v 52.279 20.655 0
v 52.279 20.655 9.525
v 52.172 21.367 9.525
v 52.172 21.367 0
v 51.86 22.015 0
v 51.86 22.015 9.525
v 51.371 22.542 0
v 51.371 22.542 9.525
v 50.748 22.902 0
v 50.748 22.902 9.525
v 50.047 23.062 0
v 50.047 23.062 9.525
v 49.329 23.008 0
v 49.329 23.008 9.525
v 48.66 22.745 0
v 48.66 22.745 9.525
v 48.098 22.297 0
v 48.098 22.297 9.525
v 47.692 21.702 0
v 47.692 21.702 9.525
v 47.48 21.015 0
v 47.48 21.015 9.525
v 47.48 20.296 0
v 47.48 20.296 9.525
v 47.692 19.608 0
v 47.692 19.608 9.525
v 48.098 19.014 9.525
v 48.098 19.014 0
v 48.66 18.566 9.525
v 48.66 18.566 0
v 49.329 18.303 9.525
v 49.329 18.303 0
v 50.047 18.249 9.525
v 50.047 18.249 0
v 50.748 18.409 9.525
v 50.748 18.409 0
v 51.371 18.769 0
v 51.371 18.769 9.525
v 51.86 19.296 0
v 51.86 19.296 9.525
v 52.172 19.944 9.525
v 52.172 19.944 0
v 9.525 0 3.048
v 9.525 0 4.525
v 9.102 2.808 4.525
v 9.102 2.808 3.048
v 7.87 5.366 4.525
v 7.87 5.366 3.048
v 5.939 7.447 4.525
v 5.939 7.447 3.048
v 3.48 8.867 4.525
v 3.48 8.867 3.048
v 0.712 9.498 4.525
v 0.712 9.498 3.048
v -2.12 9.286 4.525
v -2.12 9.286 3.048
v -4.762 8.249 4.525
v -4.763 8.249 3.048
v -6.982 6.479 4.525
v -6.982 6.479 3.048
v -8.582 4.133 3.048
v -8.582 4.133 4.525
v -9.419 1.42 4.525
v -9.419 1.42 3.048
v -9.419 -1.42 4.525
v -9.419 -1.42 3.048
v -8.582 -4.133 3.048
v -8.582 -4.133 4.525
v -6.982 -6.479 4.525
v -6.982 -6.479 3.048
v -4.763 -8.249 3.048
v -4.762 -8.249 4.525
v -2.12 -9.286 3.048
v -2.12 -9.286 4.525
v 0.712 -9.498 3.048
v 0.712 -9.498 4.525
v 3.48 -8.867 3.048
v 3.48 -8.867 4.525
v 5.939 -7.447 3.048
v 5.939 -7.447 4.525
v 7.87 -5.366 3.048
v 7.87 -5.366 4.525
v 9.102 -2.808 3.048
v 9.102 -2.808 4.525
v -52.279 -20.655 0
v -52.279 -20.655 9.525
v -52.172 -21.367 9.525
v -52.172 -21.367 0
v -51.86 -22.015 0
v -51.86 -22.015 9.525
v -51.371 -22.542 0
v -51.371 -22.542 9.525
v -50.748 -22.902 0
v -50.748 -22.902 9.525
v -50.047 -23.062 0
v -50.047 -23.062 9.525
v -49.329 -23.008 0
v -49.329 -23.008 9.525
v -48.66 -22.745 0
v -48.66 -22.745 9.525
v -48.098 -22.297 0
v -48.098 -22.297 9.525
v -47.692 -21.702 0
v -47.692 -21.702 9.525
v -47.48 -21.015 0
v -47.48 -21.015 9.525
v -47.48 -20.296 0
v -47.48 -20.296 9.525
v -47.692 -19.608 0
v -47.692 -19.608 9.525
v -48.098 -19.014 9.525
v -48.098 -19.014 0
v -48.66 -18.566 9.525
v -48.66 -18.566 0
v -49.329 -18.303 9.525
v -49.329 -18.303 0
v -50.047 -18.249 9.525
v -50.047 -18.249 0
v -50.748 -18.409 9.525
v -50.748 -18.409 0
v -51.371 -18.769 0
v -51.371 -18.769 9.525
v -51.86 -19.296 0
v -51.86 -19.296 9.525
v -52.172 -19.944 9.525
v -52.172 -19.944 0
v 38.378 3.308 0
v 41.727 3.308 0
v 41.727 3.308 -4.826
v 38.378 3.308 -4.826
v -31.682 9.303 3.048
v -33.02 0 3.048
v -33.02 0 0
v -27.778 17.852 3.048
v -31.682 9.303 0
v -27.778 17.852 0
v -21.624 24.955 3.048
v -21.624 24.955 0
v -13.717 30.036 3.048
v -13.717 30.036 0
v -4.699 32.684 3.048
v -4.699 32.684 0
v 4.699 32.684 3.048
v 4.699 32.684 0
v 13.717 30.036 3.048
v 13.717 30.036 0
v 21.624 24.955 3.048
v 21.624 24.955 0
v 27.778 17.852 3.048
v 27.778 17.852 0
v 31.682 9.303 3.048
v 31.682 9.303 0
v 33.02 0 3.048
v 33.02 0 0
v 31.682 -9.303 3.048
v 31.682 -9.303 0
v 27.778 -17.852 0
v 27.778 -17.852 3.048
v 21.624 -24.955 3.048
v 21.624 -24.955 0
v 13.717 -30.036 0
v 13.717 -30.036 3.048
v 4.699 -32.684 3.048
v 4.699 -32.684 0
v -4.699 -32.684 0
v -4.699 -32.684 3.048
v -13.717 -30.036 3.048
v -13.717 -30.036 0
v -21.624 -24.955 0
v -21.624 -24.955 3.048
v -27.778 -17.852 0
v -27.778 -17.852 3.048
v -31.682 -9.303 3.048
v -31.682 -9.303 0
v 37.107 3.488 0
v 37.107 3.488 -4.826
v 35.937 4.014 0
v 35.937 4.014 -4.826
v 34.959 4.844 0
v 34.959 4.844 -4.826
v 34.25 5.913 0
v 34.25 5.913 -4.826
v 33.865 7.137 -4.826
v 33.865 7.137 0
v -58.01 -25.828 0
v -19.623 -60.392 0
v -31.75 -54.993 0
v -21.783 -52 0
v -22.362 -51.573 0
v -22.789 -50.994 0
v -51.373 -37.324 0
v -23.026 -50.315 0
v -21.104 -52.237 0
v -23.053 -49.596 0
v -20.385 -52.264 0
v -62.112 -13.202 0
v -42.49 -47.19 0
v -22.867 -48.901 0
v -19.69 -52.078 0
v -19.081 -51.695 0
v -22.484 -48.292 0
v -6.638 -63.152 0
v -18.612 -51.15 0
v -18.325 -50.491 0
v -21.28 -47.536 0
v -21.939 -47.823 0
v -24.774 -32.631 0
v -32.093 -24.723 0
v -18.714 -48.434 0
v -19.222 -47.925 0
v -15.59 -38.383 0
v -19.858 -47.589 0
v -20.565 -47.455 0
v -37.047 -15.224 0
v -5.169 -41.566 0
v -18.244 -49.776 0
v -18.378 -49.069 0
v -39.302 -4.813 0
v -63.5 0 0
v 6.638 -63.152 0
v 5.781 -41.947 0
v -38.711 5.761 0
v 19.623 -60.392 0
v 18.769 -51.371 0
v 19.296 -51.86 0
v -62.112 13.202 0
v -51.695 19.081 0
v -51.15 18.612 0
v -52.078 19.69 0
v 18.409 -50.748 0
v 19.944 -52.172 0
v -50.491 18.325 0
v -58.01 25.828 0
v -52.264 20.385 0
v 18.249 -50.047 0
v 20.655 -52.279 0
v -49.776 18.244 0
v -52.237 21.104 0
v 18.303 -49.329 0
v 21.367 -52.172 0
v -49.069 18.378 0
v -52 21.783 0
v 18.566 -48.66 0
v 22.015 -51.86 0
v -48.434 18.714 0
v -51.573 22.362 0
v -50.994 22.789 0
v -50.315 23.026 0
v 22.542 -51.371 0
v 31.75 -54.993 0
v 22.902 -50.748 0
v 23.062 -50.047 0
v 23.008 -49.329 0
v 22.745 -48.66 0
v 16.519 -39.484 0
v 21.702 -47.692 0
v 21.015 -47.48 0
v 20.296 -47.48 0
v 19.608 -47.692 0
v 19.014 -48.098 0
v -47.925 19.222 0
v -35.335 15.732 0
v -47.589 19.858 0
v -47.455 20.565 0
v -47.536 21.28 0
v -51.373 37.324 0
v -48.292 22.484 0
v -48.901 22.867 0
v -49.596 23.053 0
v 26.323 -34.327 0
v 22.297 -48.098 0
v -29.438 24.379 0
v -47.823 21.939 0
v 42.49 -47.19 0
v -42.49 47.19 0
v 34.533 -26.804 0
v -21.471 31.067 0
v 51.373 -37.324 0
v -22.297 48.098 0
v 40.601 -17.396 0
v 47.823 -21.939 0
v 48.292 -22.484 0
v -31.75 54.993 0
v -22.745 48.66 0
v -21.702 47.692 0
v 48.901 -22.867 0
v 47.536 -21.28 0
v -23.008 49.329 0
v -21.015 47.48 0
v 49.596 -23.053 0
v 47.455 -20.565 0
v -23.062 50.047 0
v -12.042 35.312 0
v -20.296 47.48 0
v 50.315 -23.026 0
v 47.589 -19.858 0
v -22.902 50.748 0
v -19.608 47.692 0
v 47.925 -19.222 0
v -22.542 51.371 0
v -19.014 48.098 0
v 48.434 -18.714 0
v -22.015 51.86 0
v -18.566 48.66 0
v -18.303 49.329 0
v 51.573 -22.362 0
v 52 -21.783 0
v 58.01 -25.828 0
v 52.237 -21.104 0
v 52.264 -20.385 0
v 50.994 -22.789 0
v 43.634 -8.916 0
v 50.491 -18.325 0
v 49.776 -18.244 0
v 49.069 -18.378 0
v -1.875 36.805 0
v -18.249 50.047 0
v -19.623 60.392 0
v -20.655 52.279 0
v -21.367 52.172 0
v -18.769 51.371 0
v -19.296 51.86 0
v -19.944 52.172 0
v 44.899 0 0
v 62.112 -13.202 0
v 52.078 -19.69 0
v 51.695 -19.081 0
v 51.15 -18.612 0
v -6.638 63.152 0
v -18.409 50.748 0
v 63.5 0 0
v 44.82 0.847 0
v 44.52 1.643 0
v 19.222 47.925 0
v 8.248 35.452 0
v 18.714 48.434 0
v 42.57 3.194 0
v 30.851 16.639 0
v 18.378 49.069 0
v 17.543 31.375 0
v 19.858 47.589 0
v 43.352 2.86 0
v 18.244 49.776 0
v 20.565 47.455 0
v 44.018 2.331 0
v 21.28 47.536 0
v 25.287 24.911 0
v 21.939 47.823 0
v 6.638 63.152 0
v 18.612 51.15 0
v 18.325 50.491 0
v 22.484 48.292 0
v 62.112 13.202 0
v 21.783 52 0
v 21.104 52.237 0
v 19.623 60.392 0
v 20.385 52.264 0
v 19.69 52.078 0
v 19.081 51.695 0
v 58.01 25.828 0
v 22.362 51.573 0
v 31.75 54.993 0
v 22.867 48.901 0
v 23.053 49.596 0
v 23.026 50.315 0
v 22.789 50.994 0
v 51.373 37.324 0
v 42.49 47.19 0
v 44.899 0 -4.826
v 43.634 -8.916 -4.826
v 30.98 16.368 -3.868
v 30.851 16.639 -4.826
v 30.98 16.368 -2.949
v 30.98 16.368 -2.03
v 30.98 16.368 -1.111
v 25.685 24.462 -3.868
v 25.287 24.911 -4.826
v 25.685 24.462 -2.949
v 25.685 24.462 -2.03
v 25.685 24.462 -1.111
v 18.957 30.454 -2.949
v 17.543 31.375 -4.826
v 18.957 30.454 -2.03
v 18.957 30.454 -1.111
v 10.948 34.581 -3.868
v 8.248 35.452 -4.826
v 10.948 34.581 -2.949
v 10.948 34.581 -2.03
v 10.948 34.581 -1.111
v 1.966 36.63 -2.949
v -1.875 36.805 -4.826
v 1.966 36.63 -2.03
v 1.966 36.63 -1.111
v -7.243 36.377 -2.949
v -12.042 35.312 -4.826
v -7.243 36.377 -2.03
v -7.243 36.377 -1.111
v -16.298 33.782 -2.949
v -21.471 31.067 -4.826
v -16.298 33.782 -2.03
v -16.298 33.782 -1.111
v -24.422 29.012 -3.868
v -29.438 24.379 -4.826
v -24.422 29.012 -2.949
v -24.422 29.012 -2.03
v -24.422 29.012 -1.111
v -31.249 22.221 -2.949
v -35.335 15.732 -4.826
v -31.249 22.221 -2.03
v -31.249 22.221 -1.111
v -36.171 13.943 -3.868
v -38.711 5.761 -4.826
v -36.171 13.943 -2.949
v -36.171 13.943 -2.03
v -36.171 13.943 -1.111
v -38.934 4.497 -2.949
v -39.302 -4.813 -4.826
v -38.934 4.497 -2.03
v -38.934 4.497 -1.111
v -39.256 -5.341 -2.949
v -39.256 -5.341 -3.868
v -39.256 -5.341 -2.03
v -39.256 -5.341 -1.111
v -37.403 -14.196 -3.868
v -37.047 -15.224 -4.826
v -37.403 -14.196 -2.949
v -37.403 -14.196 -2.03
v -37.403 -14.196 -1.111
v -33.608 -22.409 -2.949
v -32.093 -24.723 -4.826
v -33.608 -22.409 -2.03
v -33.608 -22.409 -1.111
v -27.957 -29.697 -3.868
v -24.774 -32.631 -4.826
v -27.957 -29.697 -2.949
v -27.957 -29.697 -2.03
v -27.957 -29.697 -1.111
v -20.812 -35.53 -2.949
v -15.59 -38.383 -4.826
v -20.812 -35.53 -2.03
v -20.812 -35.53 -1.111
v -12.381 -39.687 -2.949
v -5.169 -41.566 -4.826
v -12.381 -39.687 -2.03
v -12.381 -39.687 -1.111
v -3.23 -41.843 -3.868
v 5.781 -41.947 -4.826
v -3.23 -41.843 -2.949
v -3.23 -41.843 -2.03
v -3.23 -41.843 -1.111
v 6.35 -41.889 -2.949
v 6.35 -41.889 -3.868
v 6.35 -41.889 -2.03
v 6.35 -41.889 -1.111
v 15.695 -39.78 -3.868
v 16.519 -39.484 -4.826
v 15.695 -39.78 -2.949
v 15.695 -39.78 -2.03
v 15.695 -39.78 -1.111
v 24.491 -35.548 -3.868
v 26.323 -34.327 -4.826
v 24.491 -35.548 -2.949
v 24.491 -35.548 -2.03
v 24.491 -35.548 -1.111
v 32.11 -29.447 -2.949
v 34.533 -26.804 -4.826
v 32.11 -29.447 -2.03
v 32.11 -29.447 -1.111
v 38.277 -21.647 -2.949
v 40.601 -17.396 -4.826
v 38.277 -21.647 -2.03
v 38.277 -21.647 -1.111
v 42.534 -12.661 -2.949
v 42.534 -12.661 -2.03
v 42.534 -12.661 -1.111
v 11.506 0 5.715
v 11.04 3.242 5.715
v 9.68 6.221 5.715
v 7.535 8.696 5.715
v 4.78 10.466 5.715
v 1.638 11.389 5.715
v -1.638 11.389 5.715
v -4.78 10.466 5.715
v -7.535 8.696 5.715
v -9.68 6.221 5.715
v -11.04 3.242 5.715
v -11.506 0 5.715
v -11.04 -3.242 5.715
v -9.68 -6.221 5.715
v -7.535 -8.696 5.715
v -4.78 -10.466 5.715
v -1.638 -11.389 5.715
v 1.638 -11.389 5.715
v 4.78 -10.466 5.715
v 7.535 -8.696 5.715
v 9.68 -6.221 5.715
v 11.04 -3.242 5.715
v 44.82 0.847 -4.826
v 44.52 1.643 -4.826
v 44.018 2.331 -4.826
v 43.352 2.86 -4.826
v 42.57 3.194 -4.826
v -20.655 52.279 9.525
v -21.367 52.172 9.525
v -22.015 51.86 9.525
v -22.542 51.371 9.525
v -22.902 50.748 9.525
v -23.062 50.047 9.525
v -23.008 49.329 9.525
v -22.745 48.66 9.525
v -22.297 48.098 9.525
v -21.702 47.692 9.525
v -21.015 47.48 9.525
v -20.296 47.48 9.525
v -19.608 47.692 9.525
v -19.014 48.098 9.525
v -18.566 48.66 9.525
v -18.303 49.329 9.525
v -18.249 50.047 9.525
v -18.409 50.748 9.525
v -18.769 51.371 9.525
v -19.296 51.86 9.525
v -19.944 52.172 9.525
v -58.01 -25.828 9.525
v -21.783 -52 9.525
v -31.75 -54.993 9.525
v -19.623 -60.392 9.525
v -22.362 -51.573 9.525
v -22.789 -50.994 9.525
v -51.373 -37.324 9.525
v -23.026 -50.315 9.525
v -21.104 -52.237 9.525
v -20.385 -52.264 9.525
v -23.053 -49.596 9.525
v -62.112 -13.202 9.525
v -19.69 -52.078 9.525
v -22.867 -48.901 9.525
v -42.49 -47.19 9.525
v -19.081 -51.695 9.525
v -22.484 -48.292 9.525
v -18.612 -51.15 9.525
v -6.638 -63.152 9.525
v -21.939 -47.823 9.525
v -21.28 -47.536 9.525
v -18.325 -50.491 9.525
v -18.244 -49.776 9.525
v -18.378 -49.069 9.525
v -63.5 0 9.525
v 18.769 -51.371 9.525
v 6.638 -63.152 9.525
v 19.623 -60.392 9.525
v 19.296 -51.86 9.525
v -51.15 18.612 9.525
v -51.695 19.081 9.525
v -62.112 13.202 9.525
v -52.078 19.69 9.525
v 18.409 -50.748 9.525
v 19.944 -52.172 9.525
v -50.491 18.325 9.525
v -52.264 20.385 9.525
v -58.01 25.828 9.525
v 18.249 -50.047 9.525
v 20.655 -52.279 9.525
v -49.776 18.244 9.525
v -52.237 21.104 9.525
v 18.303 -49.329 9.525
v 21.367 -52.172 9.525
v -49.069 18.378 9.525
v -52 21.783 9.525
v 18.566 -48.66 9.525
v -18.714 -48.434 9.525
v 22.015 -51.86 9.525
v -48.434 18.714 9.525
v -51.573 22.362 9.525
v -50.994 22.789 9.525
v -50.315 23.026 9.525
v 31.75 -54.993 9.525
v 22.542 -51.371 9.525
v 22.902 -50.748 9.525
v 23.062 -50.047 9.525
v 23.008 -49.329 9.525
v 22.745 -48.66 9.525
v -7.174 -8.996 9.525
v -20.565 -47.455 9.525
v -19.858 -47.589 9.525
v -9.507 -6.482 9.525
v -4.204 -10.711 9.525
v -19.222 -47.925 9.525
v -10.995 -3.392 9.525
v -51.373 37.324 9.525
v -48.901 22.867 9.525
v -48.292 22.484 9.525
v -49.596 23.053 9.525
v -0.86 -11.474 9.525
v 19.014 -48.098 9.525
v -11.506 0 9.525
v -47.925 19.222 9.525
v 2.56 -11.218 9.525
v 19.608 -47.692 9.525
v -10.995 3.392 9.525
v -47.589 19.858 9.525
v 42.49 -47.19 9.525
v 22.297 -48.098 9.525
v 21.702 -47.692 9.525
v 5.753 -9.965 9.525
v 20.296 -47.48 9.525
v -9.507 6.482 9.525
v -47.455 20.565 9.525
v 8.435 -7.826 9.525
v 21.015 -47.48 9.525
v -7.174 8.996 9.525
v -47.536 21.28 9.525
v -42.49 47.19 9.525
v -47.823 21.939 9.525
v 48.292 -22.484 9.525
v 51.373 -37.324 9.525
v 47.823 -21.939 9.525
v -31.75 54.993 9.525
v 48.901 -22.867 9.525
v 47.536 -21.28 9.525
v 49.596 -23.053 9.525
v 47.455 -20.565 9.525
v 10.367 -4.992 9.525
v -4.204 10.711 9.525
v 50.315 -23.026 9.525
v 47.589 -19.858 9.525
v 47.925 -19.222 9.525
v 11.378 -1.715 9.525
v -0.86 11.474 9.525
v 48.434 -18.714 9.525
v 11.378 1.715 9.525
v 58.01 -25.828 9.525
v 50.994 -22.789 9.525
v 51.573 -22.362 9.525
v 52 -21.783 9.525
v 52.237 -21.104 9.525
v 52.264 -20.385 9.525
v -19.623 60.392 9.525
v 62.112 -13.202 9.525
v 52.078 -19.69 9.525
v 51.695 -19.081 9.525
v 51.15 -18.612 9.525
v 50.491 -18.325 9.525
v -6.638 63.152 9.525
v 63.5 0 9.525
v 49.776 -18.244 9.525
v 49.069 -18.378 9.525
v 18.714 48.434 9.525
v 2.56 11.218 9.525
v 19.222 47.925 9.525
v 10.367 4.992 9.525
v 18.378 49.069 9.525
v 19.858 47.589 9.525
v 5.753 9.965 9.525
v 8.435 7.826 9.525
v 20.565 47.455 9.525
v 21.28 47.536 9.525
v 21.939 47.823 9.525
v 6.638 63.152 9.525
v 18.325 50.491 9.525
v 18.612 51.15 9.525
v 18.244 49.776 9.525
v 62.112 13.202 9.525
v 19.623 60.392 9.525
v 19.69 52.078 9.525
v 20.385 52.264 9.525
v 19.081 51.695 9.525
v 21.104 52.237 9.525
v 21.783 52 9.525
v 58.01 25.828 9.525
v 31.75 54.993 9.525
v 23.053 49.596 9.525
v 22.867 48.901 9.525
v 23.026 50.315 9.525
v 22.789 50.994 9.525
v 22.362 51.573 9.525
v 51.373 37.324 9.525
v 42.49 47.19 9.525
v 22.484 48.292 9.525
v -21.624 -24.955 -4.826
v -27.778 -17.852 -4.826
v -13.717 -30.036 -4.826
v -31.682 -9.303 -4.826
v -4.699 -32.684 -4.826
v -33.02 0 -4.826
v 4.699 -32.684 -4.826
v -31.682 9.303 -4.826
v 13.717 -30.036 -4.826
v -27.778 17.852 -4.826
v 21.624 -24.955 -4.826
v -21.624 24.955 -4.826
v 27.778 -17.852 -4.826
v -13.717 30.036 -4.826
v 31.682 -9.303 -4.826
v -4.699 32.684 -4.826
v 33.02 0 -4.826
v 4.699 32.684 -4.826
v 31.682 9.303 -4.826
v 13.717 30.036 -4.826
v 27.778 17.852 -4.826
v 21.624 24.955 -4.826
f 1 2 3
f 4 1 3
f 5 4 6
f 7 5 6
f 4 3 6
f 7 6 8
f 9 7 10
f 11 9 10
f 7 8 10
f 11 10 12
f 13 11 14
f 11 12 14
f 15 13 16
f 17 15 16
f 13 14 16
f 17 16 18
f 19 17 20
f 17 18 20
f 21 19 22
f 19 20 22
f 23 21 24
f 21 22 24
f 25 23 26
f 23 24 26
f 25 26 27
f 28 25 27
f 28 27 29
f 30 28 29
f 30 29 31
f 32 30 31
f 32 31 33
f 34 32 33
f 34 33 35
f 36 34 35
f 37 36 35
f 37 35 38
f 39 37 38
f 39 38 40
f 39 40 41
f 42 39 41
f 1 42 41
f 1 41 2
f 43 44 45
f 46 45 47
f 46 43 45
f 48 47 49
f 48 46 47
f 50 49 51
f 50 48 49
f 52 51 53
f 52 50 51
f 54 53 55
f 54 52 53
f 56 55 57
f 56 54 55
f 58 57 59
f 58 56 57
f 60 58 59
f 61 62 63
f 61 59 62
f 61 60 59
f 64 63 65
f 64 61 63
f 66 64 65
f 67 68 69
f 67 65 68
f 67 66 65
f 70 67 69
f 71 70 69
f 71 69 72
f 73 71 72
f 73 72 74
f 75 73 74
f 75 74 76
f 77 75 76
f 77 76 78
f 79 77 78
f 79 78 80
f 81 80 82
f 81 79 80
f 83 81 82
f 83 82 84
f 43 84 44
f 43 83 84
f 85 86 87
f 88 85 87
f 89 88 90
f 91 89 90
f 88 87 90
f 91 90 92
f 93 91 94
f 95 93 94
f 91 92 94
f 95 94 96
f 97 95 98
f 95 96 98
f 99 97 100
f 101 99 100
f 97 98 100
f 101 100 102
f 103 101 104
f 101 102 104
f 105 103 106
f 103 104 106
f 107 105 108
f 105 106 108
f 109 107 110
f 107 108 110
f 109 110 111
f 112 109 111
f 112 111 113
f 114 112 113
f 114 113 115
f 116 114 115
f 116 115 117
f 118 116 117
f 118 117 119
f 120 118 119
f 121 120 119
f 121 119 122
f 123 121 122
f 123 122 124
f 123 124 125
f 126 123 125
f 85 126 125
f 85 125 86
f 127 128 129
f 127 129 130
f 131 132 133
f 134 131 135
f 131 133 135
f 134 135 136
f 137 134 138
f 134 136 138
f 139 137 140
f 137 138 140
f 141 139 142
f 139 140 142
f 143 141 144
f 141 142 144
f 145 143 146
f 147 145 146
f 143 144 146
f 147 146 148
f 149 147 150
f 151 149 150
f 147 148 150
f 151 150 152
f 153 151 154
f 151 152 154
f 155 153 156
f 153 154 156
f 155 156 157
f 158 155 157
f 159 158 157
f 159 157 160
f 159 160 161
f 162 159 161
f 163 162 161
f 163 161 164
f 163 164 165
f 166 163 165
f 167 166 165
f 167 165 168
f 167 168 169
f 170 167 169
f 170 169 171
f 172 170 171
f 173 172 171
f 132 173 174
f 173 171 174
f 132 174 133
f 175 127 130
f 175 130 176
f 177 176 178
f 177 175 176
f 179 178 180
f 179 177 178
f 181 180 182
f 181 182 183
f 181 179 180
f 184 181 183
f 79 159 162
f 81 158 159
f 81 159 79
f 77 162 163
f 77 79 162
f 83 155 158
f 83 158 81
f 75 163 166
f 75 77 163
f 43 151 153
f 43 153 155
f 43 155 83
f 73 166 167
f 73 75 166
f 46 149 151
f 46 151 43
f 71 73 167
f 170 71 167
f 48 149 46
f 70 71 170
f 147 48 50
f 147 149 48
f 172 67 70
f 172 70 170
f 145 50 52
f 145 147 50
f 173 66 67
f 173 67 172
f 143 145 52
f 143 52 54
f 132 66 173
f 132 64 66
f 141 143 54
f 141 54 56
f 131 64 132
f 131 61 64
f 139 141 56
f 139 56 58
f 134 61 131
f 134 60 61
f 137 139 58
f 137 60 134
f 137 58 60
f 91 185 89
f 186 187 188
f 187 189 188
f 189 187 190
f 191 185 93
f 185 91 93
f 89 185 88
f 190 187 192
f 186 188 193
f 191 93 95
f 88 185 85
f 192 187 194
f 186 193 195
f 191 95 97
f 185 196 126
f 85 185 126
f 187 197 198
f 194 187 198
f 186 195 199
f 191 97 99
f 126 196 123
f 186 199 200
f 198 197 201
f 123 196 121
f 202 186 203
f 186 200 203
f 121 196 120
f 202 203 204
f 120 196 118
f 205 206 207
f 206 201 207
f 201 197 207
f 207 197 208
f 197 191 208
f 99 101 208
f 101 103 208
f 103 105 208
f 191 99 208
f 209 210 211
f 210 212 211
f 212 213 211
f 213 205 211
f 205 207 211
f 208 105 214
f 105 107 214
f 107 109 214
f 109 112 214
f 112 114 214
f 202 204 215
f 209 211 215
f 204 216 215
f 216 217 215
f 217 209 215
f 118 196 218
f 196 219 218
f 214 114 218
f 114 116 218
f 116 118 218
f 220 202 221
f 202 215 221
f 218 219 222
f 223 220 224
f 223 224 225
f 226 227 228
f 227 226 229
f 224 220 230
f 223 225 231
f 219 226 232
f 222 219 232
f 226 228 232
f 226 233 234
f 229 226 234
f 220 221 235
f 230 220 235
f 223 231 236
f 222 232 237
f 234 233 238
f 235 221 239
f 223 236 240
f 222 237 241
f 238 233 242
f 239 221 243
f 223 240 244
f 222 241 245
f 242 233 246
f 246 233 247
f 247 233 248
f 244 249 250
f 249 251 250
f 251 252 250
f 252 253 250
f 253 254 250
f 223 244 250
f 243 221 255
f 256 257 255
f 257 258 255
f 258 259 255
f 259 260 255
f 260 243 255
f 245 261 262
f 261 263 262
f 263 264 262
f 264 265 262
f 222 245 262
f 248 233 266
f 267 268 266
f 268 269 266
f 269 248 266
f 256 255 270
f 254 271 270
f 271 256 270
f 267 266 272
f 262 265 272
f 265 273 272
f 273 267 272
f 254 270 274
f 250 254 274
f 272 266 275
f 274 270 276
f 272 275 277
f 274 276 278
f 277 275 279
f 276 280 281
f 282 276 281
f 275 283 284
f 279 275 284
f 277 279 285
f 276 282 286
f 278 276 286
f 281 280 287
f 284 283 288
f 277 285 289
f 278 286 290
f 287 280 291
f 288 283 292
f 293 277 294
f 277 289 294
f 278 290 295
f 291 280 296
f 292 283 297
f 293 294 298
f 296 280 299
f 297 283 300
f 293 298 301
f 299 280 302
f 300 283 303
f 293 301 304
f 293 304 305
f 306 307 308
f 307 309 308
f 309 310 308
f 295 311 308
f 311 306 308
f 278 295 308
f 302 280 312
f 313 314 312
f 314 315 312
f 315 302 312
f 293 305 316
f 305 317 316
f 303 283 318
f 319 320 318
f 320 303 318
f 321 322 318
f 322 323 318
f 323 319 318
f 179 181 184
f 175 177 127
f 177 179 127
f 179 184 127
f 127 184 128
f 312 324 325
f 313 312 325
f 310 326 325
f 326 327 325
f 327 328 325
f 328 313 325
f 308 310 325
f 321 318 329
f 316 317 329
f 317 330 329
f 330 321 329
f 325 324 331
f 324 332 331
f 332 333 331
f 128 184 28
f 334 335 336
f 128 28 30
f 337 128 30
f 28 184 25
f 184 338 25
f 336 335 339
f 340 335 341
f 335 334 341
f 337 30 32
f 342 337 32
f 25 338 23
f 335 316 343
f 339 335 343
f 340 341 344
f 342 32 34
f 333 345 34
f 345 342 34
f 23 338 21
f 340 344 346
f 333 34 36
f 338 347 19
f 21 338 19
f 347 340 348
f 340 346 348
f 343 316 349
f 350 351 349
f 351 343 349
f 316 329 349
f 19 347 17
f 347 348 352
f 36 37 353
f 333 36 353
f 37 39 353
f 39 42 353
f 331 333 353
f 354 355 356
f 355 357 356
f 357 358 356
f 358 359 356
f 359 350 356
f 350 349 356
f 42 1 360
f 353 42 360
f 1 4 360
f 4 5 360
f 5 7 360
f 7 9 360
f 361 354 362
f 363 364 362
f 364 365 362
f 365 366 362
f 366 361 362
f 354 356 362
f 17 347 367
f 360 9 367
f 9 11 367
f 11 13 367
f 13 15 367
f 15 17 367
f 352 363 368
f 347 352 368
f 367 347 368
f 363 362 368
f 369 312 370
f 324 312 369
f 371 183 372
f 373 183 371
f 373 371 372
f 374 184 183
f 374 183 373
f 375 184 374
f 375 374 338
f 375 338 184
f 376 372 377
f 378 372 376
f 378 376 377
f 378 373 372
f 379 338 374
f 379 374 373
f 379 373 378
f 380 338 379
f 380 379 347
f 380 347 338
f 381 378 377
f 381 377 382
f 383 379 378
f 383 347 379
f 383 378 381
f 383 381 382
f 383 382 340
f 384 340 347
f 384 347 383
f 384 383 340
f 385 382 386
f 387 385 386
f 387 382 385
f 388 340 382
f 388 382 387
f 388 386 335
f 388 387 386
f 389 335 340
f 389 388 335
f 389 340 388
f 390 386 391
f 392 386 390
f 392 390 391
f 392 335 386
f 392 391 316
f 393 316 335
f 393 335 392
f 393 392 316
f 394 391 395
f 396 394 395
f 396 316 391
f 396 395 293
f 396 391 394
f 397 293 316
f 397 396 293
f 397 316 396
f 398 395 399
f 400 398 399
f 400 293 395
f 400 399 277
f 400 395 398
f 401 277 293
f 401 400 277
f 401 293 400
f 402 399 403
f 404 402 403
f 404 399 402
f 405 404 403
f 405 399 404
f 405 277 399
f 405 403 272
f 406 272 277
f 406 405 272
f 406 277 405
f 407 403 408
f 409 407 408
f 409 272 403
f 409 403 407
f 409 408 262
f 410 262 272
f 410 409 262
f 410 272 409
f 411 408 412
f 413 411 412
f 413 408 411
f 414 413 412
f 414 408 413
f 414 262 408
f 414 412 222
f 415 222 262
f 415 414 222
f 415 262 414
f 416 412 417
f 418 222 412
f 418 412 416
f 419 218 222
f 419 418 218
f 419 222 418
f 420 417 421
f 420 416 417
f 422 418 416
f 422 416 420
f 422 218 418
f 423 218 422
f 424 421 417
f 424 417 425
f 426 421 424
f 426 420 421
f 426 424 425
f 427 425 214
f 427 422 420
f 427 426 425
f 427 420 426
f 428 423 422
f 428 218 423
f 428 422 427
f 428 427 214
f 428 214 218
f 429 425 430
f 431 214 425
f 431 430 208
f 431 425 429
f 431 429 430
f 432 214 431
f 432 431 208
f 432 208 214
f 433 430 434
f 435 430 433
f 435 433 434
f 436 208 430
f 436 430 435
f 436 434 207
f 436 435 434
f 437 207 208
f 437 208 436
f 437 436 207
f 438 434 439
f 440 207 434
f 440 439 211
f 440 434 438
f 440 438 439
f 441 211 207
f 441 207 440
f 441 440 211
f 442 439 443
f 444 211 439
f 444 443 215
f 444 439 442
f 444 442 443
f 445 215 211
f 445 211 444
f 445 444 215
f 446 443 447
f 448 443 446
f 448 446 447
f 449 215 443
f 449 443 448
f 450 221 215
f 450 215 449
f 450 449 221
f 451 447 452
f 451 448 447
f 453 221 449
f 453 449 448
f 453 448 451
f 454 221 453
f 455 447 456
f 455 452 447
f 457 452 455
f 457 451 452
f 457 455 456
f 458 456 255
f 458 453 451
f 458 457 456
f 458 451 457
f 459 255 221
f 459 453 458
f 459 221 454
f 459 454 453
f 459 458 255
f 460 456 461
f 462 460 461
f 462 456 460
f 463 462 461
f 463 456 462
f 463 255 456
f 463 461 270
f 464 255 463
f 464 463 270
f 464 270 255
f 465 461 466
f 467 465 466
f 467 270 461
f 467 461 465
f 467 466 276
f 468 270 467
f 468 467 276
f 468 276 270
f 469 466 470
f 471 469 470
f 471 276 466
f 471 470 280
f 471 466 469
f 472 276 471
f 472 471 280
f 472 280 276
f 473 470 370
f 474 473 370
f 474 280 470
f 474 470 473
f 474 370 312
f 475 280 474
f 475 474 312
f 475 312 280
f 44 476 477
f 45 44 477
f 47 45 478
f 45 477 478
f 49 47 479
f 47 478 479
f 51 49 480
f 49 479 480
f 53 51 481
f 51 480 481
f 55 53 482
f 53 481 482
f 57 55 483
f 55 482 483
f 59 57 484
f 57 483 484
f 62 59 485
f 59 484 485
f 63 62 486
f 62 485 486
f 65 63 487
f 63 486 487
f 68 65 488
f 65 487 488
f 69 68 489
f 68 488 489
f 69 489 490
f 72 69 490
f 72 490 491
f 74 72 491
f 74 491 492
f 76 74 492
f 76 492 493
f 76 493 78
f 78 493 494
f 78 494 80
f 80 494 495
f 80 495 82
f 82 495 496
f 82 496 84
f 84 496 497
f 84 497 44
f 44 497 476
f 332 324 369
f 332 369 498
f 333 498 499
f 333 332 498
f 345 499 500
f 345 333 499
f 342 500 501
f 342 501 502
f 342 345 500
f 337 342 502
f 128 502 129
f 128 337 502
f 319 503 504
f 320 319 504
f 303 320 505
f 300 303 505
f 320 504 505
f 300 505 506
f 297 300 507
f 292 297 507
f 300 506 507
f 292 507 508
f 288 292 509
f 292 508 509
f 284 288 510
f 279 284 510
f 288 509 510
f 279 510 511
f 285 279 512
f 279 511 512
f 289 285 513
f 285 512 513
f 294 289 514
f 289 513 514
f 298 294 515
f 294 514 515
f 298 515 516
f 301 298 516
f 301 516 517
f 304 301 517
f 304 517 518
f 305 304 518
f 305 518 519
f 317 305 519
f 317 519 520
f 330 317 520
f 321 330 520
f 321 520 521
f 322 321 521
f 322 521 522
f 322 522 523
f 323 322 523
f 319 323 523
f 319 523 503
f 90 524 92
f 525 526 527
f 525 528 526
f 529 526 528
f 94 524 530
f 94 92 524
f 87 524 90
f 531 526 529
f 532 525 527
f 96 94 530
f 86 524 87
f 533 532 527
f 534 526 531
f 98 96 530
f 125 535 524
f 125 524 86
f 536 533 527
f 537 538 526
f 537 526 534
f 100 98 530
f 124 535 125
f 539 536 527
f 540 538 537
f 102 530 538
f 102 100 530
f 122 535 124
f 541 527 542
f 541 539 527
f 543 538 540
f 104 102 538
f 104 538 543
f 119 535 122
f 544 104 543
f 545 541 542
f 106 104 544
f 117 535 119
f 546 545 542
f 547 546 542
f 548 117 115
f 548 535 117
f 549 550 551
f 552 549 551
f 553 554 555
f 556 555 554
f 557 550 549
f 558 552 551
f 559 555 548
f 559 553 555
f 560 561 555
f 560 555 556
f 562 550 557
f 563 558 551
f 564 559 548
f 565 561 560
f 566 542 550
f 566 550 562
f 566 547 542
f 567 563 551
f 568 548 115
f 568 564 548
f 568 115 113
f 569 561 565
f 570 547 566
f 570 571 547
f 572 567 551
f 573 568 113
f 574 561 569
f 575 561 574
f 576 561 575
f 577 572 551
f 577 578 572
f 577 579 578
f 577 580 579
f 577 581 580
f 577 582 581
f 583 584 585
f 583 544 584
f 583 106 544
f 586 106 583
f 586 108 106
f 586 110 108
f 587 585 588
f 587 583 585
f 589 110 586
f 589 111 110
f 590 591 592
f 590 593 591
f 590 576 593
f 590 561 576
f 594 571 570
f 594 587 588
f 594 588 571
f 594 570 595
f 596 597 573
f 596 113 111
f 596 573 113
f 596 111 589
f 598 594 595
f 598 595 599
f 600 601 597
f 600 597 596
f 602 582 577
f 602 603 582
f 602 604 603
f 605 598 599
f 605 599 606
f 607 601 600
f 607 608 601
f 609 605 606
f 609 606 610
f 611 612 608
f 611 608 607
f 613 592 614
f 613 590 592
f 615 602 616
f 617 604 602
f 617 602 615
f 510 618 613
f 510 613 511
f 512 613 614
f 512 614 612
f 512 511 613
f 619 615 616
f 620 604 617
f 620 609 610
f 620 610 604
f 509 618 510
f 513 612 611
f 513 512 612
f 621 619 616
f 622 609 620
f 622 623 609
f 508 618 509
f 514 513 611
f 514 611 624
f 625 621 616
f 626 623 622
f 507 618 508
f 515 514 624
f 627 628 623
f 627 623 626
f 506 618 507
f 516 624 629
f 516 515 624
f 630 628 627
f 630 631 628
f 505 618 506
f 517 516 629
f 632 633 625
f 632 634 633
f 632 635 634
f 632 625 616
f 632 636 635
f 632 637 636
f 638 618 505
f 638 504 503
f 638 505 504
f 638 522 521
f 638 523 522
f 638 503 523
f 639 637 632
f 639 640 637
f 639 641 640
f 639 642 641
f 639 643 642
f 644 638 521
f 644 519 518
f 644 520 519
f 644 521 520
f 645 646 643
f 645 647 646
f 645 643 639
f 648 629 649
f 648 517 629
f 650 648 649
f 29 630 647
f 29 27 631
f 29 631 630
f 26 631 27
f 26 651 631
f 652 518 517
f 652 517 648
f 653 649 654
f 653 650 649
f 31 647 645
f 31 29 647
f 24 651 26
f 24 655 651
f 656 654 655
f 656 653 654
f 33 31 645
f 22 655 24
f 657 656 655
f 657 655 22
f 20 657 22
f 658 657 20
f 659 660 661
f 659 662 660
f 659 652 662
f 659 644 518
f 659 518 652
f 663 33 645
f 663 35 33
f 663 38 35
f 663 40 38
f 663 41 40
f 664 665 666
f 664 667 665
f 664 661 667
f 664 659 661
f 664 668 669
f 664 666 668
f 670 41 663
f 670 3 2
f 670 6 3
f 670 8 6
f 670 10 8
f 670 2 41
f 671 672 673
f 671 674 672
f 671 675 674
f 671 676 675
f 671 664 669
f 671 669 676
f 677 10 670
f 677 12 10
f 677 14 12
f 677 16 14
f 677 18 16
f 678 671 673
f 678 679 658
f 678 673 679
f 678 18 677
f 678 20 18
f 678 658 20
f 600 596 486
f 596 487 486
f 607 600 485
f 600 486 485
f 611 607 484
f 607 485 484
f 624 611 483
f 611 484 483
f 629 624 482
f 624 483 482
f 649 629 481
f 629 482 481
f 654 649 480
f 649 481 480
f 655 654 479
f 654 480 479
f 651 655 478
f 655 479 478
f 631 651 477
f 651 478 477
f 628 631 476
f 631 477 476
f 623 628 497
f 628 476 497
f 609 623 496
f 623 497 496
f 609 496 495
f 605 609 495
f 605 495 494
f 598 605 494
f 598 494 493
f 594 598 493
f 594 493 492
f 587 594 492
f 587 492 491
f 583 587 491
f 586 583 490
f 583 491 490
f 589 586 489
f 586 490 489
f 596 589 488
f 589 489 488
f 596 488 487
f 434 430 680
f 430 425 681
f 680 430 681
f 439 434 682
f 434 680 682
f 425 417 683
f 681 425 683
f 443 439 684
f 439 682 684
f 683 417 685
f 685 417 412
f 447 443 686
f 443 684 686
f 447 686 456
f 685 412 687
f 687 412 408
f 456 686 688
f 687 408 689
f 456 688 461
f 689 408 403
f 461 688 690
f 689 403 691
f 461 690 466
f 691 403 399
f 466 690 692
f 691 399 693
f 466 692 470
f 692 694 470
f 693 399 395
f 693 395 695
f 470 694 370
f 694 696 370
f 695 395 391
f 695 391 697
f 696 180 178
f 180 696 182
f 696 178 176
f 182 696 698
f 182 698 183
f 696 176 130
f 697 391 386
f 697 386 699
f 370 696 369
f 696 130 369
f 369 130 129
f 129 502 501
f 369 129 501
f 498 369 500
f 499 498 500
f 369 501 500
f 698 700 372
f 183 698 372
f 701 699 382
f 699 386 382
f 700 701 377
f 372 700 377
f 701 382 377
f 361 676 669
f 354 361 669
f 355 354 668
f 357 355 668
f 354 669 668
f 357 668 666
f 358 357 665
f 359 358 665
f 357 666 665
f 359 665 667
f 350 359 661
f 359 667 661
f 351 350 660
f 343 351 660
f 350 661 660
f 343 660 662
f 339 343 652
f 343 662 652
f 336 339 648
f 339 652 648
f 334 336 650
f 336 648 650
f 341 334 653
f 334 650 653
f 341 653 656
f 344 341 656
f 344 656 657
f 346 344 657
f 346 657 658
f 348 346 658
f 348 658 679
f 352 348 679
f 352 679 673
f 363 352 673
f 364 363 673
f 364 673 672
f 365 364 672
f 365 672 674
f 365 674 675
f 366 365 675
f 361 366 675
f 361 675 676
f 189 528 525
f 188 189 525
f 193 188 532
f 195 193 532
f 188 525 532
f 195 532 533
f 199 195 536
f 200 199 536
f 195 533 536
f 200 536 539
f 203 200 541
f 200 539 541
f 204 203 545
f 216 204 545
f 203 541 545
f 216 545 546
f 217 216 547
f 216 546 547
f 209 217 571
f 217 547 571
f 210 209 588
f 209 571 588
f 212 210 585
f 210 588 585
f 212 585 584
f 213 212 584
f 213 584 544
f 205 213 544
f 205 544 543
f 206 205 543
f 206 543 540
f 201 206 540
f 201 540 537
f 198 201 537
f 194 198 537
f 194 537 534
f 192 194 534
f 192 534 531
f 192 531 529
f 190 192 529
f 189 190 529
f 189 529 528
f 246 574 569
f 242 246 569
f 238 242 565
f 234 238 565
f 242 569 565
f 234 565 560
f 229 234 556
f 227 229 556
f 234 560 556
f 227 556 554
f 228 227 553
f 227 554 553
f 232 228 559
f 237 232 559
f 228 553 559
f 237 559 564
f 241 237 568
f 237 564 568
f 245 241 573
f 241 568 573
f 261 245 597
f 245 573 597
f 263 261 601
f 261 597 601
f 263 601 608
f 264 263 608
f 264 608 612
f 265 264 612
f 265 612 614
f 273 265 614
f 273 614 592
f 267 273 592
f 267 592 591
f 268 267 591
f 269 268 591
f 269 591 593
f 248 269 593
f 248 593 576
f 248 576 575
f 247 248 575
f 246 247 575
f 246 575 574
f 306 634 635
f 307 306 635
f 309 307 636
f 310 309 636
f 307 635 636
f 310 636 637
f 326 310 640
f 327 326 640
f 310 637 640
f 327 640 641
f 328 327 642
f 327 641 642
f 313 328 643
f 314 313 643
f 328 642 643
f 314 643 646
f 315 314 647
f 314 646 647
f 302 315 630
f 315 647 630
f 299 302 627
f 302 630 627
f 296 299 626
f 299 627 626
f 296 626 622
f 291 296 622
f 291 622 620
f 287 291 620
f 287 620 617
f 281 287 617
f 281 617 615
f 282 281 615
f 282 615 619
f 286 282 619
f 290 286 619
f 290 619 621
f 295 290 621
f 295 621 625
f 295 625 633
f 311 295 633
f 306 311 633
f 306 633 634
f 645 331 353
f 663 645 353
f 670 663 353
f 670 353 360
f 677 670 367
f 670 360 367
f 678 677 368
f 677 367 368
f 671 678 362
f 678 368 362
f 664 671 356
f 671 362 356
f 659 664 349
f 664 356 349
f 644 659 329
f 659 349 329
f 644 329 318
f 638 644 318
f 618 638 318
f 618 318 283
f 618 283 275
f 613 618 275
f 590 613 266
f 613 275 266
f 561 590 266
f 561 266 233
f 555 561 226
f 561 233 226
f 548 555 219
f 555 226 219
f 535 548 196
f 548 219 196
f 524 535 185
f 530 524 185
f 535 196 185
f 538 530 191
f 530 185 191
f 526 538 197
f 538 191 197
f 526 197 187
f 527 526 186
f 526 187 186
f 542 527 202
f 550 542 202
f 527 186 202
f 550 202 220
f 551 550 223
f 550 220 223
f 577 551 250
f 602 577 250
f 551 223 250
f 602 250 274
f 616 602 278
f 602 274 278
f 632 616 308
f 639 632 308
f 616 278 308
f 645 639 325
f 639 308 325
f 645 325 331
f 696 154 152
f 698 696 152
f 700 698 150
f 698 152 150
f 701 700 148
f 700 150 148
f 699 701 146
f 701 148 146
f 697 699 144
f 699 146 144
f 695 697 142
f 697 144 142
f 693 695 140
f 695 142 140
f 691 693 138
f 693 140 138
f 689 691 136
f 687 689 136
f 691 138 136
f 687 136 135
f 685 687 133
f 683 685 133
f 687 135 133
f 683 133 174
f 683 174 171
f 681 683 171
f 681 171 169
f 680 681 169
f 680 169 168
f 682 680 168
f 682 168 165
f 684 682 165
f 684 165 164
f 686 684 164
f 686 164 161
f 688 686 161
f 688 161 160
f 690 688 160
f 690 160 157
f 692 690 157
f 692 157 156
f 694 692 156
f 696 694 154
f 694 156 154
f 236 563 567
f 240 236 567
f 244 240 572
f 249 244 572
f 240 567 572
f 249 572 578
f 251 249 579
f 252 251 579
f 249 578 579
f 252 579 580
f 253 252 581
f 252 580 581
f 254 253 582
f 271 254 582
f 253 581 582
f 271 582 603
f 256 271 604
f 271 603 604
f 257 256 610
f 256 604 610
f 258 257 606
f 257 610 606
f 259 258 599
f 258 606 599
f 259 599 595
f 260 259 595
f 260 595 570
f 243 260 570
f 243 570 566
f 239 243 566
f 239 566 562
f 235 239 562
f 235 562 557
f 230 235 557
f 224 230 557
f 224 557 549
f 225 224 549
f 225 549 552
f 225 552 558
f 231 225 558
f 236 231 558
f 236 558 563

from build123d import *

# Parameters (mm, degrees)
SKETCH1_R                         = 63.5
SKETCH1_R_2                       = 9.525
BOSS_EXTRUDE1_DEPTH               = 9.525
SKETCH4_R                         = 2.413
CUT_EXTRUDE1_DEPTH                = 10.525
CIRPATTERN1_COUNT                 = 8
SKETCH7_R                         = 33.02
BOSS_EXTRUDE4_DEPTH               = 4.826
SKETCH9_R                         = 33.02
CUT_EXTRUDE2_DEPTH                = 3.048
PIPE_TAP_DRILL_FOR_3_4_TAP4_D     = 23.0124
PIPE_TAP_DRILL_FOR_3_4_TAP4_DEPTH = 3.81
PIPE_TAP_DRILL_FOR_3_4_TAP4_TIP   = 6.913622455


with BuildPart() as part:
    # Sketch1 → Boss-Extrude1 (new body)
    with BuildSketch(Plane.XY):
        Circle(SKETCH1_R)
        Circle(SKETCH1_R_2, mode=Mode.SUBTRACT)
    extrude(amount=BOSS_EXTRUDE1_DEPTH)

    # Sketch4 → Cut-Extrude1 (cut, through all)
    with BuildSketch(Plane.XY.offset(9.525)):
        with Locations((49.866397767, 20.655338262)):
            Circle(SKETCH4_R)
    cut_extrude1 = extrude(amount=-CUT_EXTRUDE1_DEPTH, mode=Mode.SUBTRACT)

    # CirPattern1: Cut-Extrude1 ×8 about axis
    cirpattern1_axis = Axis((0, 0, 0), (0, 0, 1))
    for i in range(1, CIRPATTERN1_COUNT):
        add(cut_extrude1.rotate(cirpattern1_axis, i * 360 / CIRPATTERN1_COUNT), mode=Mode.SUBTRACT)

    # Sketch7 → Boss-Extrude4 (add)
    with BuildSketch(Plane.XY):
        with BuildLine():
            ThreePointArc((44.898742199, 0), (44.018213285, 2.330669915), (41.72653773, 3.308205888))
            Line((41.72653773, 3.308205888), (38.377645632, 3.308205888))
            ThreePointArc((38.377645632, 3.308205888), (36.132581602, 2.378269918), (35.202645632, 0.133205888))
            ThreePointArc((35.202645632, 0.133205888), (34.829644744, -0.48063442), (34.295865632, 0))
            add(Edge.make_bspline(
                [(34.295865632, 0), (34.29882834, 0.071916436), (34.304754577, 0.21576926), (34.311966888, 0.431642324), (34.317934755, 0.647612083), (34.327139988, 1.079917114), (34.332942166, 2.090306576), (34.279898225, 3.607362054), (34.120445155, 5.41030125), (33.960201682, 6.560746683), (33.865422793, 7.135076209), (33.865142183, 7.136775827)],
                knots=[0, 0, 0, 0, 0.000870248, 0.001740737, 0.002611466, 0.003482435, 0.006968712, 0.014826916, 0.02182843, 0.028845498, 0.028866325, 0.028866325, 0.028866325, 0.028866325], degree=3))
            add(Edge.make_bspline(
                [(33.865142183, 7.136775827), (33.7706713, 7.708973751), (33.552478291, 8.851599937), (33.138997804, 10.54970943), (32.639140351, 12.230302519), (32.054174895, 13.887355713), (31.385187056, 15.516557503), (30.633483645, 17.113645751), (29.800589951, 18.674419055), (28.8882464, 20.194747988), (27.898404875, 21.670586138), (26.833224521, 23.097980967), (25.695067067, 24.473084443), (24.486491635, 25.79216345), (23.210249051, 27.051609932), (21.869275652, 28.247950753), (20.466686605, 29.377857252), (19.005768742, 30.438154464), (17.489972932, 31.425829986), (15.922906004, 32.338042467), (14.30832223, 33.172129685), (12.650114403, 33.925616212), (10.95230451, 34.596220626), (9.219034045, 35.18186226), (7.454553956, 35.680667464), (5.663214286, 36.090975363), (3.849453494, 36.411343101), (2.017787512, 36.640550541), (0.172798549, 36.777604421), (-1.680876324, 36.82174194), (-3.538556782, 36.772433779), (-5.395531021, 36.629386524), (-7.247067665, 36.392544506), (-9.088427776, 36.062091031), (-10.914876942, 35.638449008), (-12.721697408, 35.122280961), (-14.504200214, 34.514488429), (-16.257737325, 33.816210747), (-17.977713699, 33.028823219), (-19.659599284, 32.153934663), (-21.298940898, 31.193384362), (-22.891373965, 30.149238397), (-24.43263408, 29.02378539), (-25.918568367, 27.819531655), (-27.345146601, 26.539195761), (-28.708472073, 25.185702541), (-30.004792148, 23.762176529), (-31.230508517, 22.271934869), (-32.382187085, 20.718479685), (-33.456567491, 19.105489956), (-34.450572223, 17.436812889), (-35.361315302, 15.716454831), (-36.186110516, 13.948571725), (-36.92247918, 12.137459144), (-37.568157395, 10.287541924), (-38.121102788, 8.403363415), (-38.579500717, 6.489574383), (-38.941769921, 4.550921586), (-39.206567586, 2.592236057), (-39.372793836, 0.618421113), (-39.439595611, -1.36555987), (-39.406369933, -3.354695889), (-39.272766542, -5.343940927), (-39.038689903, -7.328226707), (-38.704300556, -9.302475561), (-38.270015827, -11.261613379), (-37.736509879, -13.200582609), (-37.104713104, -15.11435526), (-36.375810853, -16.997945903), (-35.551241515, -18.846424601), (-34.632693929, -20.654929769), (-33.622104149, -22.418680905), (-32.521651558, -24.132991168), (-31.333754343, -25.793279776), (-30.061064337, -27.395084183), (-28.706461239, -28.934071999), (-27.273046228, -30.406052641), (-25.764134977, -31.806988658), (-24.18325009, -33.133006716), (-22.534112978, -34.380408214), (-20.820635184, -35.545679488), (-19.046909189, -36.625501594), (-17.217198713, -37.616759627), (-15.335928538, -38.516551562), (-13.407673866, -39.322196576), (-11.437149261, -40.031242854), (-9.429197172, -40.641474829), (-7.388776087, -41.15091985), (-5.32094834, -41.557854256), (-3.230867597, -41.86080884), (-1.123766056, -42.058573678), (0.995058608, -42.150202316), (3.120256518, -42.135015304), (5.246439066, -42.01260305), (7.368192535, -41.782828005), (9.480091844, -41.445826152), (11.576714375, -41.002007803), (13.652653862, -40.452057696), (15.702534288, -39.796934391), (17.72102376, -39.037868953), (19.702848338, -38.176362944), (21.642805765, -37.214185701), (23.535779073, -36.153370925), (25.376750026, -34.996212572), (27.16081237, -33.745260064), (28.883184839, -32.403312824), (30.539223912, -30.973414146), (32.12443625, -29.458844418), (33.634490817, -27.863113704), (35.065230621, -26.189953715), (36.412684063, -24.44330917), (37.673075861, -22.62732858), (38.842837509, -20.746354475), (39.91861725, -18.804913085), (40.897289536, -16.807703518), (41.775963949, -14.759586443), (42.55199355, -12.665572318), (43.22298264, -10.530809183), (43.786793912, -8.360570051), (44.241554967, -6.16023993), (44.571284542, -4.028278167), (44.740560267, -2.440845712), (44.813728039, -1.50376068), (44.839477521, -1.128293226), (44.857032226, -0.846470241), (44.872782179, -0.564469795), (44.886887576, -0.282309503), (44.894790326, -0.094111086), (44.898742199, 0)],
                knots=[0.028866325, 0.028866325, 0.028866325, 0.028866325, 0.035878186, 0.042926556, 0.049990663, 0.057070561, 0.064166299, 0.071277925, 0.078405484, 0.085549018, 0.092708569, 0.099884178, 0.107075882, 0.11428372, 0.121507729, 0.128747942, 0.136004396, 0.143277124, 0.150566158, 0.157871532, 0.165193276, 0.172531421, 0.179885999, 0.187257038, 0.194644569, 0.202048619, 0.209469218, 0.216906393, 0.224360171, 0.23183058, 0.239317647, 0.246821397, 0.254341857, 0.261879053, 0.269433009, 0.277003751, 0.284591303, 0.292195691, 0.299816937, 0.307455067, 0.315110103, 0.32278207, 0.33047099, 0.338176886, 0.345899781, 0.353639698, 0.361396658, 0.369170685, 0.376961799, 0.384770023, 0.392595378, 0.400437886, 0.408297568, 0.416174444, 0.424068536, 0.431979864, 0.439908449, 0.447854312, 0.455817472, 0.463797949, 0.471795764, 0.479810937, 0.487843486, 0.495893432, 0.503960795, 0.512045592, 0.520147845, 0.52826757, 0.536404789, 0.544559519, 0.552731779, 0.560921587, 0.569128963, 0.577353925, 0.58559649, 0.593856678, 0.602134505, 0.610429991, 0.618743153, 0.627074009, 0.635422576, 0.643788872, 0.652172916, 0.660574723, 0.668994312, 0.677431699, 0.685886903, 0.69435994, 0.702850826, 0.71135958, 0.719886217, 0.728430756, 0.736993211, 0.745573601, 0.754171941, 0.762788249, 0.771422539, 0.78007483, 0.788745137, 0.797433476, 0.806139864, 0.814864316, 0.823606849, 0.832367479, 0.841146221, 0.849943091, 0.858758106, 0.86759128, 0.87644263, 0.885312171, 0.894199918, 0.903105888, 0.912030094, 0.920972554, 0.929933282, 0.938912294, 0.947909603, 0.956925227, 0.96595918, 0.975011476, 0.984082132, 0.992034027, 0.994308583, 0.995446291, 0.996584287, 0.997722571, 0.998861142, 1, 1, 1, 1], degree=3))
        make_face()
        Circle(SKETCH7_R, mode=Mode.SUBTRACT)
        with BuildLine():
            ThreePointArc((35.202645632, 0.133205888), (36.132581602, 2.378269918), (38.377645632, 3.308205888))
            ThreePointArc((38.377645632, 3.308205888), (35.418733874, 4.394308044), (33.865142183, 7.136775827))
            add(Edge.make_bspline(
                [(34.295865632, 0), (34.29882834, 0.071916436), (34.304754577, 0.21576926), (34.311966888, 0.431642324), (34.317934755, 0.647612083), (34.327139988, 1.079917114), (34.332942166, 2.090306576), (34.279898225, 3.607362054), (34.120445155, 5.41030125), (33.960201682, 6.560746683), (33.865422793, 7.135076209), (33.865142183, 7.136775827)],
                knots=[0, 0, 0, 0, 0.000870248, 0.001740737, 0.002611466, 0.003482435, 0.006968712, 0.014826916, 0.02182843, 0.028845498, 0.028866325, 0.028866325, 0.028866325, 0.028866325], degree=3))
            ThreePointArc((34.295865632, 0), (34.829644744, -0.48063442), (35.202645632, 0.133205888))
        make_face()
    extrude(amount=-BOSS_EXTRUDE4_DEPTH)

    # Sketch9 → Cut-Extrude2 (cut)
    with BuildSketch(Plane(origin=(0, 0, 0), x_dir=(-1, 0, 0), z_dir=(0, 0, -1))):
        Circle(SKETCH9_R)
    extrude(amount=-CUT_EXTRUDE2_DEPTH, mode=Mode.SUBTRACT)

    # Pipe Tap Drill for 3/4 Tap4
    with Locations(Plane.XY.offset(9.525)):
        with Locations((0, 0)):
            Hole(PIPE_TAP_DRILL_FOR_3_4_TAP4_D / 2, depth=PIPE_TAP_DRILL_FOR_3_4_TAP4_DEPTH)
            with Locations((0, 0, -(PIPE_TAP_DRILL_FOR_3_4_TAP4_DEPTH + PIPE_TAP_DRILL_FOR_3_4_TAP4_TIP / 2))):  # 118° drill point
                Cone(0, PIPE_TAP_DRILL_FOR_3_4_TAP4_D / 2, PIPE_TAP_DRILL_FOR_3_4_TAP4_TIP, mode=Mode.SUBTRACT)


solid = part.part
